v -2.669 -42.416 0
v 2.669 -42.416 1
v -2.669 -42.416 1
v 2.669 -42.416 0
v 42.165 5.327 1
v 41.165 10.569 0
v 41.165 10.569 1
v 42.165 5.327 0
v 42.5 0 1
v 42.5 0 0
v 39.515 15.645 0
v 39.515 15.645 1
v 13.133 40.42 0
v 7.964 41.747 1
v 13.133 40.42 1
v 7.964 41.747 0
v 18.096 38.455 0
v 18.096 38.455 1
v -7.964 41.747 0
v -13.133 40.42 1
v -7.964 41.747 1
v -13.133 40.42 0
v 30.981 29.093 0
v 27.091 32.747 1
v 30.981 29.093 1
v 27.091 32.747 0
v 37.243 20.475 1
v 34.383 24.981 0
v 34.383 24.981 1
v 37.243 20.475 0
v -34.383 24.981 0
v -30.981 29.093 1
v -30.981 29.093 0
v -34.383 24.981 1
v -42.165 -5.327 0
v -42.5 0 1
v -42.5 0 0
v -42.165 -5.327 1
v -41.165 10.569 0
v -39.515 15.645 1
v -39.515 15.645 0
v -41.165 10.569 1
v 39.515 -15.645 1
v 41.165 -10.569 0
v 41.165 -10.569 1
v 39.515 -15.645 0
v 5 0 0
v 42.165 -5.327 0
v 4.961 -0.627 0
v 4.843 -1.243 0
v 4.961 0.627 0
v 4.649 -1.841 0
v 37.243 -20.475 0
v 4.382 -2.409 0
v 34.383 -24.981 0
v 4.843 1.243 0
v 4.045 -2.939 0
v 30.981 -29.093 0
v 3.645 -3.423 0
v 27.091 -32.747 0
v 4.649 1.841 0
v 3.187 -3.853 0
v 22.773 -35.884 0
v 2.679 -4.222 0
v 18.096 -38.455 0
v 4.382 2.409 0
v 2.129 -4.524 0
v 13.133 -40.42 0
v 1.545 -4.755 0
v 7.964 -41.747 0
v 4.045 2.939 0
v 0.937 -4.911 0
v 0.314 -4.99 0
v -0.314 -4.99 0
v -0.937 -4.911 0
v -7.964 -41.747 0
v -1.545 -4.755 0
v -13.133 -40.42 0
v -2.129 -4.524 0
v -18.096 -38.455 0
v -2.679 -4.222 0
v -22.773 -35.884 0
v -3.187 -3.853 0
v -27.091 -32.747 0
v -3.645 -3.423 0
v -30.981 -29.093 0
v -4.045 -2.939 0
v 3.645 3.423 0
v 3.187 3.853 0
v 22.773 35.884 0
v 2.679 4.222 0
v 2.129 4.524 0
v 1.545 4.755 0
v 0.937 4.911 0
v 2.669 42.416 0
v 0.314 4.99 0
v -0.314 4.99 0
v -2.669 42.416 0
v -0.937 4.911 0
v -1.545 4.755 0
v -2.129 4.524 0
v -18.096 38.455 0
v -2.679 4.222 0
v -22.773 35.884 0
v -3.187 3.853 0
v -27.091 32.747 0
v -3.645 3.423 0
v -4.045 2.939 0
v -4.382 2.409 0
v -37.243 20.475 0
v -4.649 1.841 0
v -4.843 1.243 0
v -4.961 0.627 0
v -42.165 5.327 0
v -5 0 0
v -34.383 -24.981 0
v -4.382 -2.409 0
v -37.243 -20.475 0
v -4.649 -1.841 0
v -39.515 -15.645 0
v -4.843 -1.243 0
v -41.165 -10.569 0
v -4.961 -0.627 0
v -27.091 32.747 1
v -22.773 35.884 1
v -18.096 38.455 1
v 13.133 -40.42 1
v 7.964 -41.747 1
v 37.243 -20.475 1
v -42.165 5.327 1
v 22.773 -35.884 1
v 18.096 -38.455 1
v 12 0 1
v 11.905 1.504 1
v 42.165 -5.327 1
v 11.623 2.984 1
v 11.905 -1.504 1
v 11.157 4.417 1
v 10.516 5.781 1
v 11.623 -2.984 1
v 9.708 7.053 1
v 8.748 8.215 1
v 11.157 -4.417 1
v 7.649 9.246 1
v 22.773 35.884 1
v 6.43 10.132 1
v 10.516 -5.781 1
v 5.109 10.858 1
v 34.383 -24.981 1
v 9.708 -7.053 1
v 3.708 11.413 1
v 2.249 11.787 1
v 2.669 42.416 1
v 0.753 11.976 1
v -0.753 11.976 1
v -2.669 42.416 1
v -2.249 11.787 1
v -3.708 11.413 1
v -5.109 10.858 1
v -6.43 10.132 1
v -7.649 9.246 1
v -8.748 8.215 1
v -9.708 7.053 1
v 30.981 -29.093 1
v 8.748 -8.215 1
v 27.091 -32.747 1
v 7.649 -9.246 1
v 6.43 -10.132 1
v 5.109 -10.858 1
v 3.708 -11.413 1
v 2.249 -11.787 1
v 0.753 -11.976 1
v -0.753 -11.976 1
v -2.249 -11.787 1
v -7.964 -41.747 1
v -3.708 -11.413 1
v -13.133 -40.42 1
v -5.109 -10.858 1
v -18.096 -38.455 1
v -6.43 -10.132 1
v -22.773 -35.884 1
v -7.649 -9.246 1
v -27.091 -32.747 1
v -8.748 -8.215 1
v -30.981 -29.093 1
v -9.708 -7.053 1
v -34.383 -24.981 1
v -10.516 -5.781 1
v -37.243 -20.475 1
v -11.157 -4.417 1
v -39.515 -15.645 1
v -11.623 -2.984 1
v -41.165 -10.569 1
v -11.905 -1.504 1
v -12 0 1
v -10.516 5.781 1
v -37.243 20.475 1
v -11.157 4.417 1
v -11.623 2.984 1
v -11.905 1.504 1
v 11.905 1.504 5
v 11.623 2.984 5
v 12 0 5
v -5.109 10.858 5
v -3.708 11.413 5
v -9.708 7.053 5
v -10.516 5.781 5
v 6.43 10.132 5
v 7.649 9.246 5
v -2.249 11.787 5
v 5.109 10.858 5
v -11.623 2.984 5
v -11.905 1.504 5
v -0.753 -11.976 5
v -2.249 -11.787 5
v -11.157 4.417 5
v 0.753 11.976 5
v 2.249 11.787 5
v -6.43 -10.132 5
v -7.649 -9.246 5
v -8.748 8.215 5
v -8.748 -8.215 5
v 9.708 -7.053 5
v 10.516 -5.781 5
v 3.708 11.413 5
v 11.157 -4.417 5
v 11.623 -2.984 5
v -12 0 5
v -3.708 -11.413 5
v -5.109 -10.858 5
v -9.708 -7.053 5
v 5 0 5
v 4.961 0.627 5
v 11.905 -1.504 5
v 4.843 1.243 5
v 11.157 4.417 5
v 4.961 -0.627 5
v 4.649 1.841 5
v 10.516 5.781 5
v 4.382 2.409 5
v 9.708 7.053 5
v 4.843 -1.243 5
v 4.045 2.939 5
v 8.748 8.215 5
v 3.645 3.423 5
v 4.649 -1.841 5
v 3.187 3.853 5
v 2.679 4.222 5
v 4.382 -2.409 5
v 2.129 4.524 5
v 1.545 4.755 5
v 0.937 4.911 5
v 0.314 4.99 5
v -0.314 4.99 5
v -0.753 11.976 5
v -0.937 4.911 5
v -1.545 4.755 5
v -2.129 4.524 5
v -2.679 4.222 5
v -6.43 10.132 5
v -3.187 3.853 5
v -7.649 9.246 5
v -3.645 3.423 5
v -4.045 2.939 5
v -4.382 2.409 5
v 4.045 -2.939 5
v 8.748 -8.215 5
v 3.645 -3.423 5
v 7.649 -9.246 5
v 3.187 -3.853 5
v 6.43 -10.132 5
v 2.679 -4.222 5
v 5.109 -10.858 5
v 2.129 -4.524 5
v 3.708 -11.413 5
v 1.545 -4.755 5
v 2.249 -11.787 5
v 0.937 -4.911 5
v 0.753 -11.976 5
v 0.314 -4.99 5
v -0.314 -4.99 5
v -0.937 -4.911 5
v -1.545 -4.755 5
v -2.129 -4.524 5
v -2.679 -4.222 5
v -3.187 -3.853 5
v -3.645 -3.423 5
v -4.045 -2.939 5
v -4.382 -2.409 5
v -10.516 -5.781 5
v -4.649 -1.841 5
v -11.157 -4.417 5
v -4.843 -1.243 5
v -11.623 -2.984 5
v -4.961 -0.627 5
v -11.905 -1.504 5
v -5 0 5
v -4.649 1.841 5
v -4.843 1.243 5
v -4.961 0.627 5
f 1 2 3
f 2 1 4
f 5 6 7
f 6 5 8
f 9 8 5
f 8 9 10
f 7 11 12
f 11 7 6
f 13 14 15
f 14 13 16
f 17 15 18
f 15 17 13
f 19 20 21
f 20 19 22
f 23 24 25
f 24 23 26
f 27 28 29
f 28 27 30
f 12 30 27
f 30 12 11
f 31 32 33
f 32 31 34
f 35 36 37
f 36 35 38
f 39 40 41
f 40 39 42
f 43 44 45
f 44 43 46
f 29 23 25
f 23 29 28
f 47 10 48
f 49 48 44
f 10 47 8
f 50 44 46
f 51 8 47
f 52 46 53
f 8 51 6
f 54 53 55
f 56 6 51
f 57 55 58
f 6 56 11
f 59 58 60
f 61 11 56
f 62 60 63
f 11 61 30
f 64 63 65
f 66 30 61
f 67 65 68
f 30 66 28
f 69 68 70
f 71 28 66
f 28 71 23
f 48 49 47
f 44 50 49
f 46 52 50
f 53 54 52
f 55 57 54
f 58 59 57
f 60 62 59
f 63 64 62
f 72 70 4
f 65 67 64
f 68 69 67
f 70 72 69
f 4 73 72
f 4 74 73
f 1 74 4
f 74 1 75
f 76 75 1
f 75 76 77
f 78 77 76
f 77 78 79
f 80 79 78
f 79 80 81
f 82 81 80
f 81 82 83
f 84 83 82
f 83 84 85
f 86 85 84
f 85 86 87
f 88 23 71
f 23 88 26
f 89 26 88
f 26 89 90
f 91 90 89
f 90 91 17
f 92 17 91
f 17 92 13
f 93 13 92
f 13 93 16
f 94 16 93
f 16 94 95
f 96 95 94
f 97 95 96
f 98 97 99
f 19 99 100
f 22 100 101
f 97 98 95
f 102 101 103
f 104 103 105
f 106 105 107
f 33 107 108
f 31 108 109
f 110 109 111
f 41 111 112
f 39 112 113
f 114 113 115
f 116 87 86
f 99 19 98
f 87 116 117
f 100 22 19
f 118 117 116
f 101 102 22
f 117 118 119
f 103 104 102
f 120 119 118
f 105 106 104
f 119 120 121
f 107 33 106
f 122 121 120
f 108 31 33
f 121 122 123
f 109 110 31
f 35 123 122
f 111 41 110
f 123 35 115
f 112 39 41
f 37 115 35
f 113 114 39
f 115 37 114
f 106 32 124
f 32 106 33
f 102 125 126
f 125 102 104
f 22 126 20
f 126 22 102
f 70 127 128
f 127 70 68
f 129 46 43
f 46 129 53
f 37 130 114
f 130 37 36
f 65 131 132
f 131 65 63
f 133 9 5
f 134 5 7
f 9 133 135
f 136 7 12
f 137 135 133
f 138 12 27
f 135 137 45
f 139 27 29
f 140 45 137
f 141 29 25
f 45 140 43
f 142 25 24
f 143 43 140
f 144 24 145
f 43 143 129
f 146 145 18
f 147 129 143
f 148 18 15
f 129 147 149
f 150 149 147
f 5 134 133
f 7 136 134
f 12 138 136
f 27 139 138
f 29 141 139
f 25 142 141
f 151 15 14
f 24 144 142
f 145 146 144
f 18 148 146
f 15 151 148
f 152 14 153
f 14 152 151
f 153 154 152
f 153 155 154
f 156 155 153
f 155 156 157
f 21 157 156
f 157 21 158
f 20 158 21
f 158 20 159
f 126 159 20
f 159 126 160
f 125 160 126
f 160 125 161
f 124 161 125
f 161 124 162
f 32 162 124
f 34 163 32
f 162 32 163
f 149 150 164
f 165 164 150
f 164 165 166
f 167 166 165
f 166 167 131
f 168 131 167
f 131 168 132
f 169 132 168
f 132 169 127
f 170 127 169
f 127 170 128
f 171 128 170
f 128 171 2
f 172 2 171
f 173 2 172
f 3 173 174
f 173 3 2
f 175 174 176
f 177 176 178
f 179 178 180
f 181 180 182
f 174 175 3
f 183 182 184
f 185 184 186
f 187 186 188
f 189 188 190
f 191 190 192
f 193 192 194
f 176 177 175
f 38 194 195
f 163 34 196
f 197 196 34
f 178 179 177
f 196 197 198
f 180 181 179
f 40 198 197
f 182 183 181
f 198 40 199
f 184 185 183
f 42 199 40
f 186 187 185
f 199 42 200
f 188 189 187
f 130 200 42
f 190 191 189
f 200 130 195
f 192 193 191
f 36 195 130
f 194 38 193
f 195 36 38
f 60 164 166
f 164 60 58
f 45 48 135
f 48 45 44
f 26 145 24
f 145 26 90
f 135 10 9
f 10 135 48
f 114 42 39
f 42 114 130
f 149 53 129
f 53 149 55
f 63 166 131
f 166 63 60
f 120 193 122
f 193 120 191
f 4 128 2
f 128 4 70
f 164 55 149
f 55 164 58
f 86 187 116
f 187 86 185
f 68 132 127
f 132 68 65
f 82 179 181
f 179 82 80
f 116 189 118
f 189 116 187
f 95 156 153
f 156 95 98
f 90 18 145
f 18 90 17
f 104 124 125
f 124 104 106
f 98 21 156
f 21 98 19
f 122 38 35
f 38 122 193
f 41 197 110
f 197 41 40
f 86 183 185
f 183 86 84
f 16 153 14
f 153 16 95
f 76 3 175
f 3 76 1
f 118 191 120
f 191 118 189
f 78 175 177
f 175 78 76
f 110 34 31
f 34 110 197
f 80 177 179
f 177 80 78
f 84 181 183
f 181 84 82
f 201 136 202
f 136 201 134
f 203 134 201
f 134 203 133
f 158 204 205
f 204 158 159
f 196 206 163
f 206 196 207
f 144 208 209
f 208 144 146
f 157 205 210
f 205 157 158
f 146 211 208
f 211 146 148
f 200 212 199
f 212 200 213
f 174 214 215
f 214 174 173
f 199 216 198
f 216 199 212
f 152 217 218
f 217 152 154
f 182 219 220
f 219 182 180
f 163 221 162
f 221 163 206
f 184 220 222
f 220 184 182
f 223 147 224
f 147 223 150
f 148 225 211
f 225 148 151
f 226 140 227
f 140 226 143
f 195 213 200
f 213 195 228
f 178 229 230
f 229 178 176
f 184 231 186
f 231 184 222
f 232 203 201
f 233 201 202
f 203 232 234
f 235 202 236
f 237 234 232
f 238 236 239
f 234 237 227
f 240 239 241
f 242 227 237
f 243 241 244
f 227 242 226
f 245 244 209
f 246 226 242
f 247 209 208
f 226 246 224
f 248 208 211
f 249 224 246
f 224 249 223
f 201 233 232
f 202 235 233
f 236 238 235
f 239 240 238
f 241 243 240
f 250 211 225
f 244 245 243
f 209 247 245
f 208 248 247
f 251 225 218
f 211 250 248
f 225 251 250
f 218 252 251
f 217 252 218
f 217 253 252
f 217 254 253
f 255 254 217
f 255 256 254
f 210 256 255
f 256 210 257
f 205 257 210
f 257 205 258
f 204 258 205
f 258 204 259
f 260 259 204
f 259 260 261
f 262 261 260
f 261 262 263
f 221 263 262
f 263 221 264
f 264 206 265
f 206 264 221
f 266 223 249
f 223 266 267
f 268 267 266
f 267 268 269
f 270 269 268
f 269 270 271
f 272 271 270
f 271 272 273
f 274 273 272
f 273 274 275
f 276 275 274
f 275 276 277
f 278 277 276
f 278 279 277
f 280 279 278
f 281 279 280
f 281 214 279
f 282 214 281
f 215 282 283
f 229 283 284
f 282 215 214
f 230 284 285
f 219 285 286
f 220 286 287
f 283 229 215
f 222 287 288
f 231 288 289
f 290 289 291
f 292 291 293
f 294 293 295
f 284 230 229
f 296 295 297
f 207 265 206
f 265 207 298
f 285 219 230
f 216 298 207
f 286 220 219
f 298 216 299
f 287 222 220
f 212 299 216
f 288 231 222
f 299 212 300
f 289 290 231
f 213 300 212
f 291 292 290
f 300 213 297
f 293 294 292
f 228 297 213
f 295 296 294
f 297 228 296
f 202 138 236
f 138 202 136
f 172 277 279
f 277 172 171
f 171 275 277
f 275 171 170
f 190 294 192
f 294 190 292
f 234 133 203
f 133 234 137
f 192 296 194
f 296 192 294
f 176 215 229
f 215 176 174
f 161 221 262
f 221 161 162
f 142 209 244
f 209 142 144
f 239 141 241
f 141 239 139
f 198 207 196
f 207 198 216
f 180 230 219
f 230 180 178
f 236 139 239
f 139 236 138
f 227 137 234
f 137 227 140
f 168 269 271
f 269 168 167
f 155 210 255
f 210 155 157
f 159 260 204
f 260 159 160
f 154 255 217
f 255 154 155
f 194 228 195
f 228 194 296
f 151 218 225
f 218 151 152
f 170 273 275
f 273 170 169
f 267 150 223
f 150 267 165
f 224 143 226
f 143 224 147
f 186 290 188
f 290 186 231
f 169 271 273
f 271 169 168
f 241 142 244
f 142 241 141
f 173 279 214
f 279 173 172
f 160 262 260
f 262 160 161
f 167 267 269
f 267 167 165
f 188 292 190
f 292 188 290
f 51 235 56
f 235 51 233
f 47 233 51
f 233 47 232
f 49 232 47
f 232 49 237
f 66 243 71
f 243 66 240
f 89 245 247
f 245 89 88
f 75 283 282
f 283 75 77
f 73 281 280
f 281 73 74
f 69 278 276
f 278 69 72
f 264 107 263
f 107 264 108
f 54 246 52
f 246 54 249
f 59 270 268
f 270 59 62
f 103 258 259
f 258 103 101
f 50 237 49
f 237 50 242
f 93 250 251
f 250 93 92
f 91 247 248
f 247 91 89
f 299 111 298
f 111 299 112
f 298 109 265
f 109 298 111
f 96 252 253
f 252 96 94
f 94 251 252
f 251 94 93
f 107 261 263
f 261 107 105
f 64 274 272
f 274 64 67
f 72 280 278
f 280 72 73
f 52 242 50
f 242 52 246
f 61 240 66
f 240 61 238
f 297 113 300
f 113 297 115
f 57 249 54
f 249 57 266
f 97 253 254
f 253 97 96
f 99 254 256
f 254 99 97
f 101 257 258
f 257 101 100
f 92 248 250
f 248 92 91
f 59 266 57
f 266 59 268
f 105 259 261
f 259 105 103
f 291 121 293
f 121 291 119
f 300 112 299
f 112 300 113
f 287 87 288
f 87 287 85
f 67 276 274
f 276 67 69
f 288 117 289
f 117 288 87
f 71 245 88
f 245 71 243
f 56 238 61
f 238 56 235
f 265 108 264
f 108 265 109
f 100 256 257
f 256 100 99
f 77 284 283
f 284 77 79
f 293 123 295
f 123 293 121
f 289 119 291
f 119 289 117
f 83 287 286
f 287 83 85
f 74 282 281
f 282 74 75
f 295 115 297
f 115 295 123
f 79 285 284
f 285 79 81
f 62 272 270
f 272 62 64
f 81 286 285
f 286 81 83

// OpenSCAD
$fn=50;

difference(){
  union(){
    cylinder(d=85,h=1);
    cylinder(d=24,h=5);
  }
  translate([0,0,-0.5]) cylinder(d=10,h=6);
  }
